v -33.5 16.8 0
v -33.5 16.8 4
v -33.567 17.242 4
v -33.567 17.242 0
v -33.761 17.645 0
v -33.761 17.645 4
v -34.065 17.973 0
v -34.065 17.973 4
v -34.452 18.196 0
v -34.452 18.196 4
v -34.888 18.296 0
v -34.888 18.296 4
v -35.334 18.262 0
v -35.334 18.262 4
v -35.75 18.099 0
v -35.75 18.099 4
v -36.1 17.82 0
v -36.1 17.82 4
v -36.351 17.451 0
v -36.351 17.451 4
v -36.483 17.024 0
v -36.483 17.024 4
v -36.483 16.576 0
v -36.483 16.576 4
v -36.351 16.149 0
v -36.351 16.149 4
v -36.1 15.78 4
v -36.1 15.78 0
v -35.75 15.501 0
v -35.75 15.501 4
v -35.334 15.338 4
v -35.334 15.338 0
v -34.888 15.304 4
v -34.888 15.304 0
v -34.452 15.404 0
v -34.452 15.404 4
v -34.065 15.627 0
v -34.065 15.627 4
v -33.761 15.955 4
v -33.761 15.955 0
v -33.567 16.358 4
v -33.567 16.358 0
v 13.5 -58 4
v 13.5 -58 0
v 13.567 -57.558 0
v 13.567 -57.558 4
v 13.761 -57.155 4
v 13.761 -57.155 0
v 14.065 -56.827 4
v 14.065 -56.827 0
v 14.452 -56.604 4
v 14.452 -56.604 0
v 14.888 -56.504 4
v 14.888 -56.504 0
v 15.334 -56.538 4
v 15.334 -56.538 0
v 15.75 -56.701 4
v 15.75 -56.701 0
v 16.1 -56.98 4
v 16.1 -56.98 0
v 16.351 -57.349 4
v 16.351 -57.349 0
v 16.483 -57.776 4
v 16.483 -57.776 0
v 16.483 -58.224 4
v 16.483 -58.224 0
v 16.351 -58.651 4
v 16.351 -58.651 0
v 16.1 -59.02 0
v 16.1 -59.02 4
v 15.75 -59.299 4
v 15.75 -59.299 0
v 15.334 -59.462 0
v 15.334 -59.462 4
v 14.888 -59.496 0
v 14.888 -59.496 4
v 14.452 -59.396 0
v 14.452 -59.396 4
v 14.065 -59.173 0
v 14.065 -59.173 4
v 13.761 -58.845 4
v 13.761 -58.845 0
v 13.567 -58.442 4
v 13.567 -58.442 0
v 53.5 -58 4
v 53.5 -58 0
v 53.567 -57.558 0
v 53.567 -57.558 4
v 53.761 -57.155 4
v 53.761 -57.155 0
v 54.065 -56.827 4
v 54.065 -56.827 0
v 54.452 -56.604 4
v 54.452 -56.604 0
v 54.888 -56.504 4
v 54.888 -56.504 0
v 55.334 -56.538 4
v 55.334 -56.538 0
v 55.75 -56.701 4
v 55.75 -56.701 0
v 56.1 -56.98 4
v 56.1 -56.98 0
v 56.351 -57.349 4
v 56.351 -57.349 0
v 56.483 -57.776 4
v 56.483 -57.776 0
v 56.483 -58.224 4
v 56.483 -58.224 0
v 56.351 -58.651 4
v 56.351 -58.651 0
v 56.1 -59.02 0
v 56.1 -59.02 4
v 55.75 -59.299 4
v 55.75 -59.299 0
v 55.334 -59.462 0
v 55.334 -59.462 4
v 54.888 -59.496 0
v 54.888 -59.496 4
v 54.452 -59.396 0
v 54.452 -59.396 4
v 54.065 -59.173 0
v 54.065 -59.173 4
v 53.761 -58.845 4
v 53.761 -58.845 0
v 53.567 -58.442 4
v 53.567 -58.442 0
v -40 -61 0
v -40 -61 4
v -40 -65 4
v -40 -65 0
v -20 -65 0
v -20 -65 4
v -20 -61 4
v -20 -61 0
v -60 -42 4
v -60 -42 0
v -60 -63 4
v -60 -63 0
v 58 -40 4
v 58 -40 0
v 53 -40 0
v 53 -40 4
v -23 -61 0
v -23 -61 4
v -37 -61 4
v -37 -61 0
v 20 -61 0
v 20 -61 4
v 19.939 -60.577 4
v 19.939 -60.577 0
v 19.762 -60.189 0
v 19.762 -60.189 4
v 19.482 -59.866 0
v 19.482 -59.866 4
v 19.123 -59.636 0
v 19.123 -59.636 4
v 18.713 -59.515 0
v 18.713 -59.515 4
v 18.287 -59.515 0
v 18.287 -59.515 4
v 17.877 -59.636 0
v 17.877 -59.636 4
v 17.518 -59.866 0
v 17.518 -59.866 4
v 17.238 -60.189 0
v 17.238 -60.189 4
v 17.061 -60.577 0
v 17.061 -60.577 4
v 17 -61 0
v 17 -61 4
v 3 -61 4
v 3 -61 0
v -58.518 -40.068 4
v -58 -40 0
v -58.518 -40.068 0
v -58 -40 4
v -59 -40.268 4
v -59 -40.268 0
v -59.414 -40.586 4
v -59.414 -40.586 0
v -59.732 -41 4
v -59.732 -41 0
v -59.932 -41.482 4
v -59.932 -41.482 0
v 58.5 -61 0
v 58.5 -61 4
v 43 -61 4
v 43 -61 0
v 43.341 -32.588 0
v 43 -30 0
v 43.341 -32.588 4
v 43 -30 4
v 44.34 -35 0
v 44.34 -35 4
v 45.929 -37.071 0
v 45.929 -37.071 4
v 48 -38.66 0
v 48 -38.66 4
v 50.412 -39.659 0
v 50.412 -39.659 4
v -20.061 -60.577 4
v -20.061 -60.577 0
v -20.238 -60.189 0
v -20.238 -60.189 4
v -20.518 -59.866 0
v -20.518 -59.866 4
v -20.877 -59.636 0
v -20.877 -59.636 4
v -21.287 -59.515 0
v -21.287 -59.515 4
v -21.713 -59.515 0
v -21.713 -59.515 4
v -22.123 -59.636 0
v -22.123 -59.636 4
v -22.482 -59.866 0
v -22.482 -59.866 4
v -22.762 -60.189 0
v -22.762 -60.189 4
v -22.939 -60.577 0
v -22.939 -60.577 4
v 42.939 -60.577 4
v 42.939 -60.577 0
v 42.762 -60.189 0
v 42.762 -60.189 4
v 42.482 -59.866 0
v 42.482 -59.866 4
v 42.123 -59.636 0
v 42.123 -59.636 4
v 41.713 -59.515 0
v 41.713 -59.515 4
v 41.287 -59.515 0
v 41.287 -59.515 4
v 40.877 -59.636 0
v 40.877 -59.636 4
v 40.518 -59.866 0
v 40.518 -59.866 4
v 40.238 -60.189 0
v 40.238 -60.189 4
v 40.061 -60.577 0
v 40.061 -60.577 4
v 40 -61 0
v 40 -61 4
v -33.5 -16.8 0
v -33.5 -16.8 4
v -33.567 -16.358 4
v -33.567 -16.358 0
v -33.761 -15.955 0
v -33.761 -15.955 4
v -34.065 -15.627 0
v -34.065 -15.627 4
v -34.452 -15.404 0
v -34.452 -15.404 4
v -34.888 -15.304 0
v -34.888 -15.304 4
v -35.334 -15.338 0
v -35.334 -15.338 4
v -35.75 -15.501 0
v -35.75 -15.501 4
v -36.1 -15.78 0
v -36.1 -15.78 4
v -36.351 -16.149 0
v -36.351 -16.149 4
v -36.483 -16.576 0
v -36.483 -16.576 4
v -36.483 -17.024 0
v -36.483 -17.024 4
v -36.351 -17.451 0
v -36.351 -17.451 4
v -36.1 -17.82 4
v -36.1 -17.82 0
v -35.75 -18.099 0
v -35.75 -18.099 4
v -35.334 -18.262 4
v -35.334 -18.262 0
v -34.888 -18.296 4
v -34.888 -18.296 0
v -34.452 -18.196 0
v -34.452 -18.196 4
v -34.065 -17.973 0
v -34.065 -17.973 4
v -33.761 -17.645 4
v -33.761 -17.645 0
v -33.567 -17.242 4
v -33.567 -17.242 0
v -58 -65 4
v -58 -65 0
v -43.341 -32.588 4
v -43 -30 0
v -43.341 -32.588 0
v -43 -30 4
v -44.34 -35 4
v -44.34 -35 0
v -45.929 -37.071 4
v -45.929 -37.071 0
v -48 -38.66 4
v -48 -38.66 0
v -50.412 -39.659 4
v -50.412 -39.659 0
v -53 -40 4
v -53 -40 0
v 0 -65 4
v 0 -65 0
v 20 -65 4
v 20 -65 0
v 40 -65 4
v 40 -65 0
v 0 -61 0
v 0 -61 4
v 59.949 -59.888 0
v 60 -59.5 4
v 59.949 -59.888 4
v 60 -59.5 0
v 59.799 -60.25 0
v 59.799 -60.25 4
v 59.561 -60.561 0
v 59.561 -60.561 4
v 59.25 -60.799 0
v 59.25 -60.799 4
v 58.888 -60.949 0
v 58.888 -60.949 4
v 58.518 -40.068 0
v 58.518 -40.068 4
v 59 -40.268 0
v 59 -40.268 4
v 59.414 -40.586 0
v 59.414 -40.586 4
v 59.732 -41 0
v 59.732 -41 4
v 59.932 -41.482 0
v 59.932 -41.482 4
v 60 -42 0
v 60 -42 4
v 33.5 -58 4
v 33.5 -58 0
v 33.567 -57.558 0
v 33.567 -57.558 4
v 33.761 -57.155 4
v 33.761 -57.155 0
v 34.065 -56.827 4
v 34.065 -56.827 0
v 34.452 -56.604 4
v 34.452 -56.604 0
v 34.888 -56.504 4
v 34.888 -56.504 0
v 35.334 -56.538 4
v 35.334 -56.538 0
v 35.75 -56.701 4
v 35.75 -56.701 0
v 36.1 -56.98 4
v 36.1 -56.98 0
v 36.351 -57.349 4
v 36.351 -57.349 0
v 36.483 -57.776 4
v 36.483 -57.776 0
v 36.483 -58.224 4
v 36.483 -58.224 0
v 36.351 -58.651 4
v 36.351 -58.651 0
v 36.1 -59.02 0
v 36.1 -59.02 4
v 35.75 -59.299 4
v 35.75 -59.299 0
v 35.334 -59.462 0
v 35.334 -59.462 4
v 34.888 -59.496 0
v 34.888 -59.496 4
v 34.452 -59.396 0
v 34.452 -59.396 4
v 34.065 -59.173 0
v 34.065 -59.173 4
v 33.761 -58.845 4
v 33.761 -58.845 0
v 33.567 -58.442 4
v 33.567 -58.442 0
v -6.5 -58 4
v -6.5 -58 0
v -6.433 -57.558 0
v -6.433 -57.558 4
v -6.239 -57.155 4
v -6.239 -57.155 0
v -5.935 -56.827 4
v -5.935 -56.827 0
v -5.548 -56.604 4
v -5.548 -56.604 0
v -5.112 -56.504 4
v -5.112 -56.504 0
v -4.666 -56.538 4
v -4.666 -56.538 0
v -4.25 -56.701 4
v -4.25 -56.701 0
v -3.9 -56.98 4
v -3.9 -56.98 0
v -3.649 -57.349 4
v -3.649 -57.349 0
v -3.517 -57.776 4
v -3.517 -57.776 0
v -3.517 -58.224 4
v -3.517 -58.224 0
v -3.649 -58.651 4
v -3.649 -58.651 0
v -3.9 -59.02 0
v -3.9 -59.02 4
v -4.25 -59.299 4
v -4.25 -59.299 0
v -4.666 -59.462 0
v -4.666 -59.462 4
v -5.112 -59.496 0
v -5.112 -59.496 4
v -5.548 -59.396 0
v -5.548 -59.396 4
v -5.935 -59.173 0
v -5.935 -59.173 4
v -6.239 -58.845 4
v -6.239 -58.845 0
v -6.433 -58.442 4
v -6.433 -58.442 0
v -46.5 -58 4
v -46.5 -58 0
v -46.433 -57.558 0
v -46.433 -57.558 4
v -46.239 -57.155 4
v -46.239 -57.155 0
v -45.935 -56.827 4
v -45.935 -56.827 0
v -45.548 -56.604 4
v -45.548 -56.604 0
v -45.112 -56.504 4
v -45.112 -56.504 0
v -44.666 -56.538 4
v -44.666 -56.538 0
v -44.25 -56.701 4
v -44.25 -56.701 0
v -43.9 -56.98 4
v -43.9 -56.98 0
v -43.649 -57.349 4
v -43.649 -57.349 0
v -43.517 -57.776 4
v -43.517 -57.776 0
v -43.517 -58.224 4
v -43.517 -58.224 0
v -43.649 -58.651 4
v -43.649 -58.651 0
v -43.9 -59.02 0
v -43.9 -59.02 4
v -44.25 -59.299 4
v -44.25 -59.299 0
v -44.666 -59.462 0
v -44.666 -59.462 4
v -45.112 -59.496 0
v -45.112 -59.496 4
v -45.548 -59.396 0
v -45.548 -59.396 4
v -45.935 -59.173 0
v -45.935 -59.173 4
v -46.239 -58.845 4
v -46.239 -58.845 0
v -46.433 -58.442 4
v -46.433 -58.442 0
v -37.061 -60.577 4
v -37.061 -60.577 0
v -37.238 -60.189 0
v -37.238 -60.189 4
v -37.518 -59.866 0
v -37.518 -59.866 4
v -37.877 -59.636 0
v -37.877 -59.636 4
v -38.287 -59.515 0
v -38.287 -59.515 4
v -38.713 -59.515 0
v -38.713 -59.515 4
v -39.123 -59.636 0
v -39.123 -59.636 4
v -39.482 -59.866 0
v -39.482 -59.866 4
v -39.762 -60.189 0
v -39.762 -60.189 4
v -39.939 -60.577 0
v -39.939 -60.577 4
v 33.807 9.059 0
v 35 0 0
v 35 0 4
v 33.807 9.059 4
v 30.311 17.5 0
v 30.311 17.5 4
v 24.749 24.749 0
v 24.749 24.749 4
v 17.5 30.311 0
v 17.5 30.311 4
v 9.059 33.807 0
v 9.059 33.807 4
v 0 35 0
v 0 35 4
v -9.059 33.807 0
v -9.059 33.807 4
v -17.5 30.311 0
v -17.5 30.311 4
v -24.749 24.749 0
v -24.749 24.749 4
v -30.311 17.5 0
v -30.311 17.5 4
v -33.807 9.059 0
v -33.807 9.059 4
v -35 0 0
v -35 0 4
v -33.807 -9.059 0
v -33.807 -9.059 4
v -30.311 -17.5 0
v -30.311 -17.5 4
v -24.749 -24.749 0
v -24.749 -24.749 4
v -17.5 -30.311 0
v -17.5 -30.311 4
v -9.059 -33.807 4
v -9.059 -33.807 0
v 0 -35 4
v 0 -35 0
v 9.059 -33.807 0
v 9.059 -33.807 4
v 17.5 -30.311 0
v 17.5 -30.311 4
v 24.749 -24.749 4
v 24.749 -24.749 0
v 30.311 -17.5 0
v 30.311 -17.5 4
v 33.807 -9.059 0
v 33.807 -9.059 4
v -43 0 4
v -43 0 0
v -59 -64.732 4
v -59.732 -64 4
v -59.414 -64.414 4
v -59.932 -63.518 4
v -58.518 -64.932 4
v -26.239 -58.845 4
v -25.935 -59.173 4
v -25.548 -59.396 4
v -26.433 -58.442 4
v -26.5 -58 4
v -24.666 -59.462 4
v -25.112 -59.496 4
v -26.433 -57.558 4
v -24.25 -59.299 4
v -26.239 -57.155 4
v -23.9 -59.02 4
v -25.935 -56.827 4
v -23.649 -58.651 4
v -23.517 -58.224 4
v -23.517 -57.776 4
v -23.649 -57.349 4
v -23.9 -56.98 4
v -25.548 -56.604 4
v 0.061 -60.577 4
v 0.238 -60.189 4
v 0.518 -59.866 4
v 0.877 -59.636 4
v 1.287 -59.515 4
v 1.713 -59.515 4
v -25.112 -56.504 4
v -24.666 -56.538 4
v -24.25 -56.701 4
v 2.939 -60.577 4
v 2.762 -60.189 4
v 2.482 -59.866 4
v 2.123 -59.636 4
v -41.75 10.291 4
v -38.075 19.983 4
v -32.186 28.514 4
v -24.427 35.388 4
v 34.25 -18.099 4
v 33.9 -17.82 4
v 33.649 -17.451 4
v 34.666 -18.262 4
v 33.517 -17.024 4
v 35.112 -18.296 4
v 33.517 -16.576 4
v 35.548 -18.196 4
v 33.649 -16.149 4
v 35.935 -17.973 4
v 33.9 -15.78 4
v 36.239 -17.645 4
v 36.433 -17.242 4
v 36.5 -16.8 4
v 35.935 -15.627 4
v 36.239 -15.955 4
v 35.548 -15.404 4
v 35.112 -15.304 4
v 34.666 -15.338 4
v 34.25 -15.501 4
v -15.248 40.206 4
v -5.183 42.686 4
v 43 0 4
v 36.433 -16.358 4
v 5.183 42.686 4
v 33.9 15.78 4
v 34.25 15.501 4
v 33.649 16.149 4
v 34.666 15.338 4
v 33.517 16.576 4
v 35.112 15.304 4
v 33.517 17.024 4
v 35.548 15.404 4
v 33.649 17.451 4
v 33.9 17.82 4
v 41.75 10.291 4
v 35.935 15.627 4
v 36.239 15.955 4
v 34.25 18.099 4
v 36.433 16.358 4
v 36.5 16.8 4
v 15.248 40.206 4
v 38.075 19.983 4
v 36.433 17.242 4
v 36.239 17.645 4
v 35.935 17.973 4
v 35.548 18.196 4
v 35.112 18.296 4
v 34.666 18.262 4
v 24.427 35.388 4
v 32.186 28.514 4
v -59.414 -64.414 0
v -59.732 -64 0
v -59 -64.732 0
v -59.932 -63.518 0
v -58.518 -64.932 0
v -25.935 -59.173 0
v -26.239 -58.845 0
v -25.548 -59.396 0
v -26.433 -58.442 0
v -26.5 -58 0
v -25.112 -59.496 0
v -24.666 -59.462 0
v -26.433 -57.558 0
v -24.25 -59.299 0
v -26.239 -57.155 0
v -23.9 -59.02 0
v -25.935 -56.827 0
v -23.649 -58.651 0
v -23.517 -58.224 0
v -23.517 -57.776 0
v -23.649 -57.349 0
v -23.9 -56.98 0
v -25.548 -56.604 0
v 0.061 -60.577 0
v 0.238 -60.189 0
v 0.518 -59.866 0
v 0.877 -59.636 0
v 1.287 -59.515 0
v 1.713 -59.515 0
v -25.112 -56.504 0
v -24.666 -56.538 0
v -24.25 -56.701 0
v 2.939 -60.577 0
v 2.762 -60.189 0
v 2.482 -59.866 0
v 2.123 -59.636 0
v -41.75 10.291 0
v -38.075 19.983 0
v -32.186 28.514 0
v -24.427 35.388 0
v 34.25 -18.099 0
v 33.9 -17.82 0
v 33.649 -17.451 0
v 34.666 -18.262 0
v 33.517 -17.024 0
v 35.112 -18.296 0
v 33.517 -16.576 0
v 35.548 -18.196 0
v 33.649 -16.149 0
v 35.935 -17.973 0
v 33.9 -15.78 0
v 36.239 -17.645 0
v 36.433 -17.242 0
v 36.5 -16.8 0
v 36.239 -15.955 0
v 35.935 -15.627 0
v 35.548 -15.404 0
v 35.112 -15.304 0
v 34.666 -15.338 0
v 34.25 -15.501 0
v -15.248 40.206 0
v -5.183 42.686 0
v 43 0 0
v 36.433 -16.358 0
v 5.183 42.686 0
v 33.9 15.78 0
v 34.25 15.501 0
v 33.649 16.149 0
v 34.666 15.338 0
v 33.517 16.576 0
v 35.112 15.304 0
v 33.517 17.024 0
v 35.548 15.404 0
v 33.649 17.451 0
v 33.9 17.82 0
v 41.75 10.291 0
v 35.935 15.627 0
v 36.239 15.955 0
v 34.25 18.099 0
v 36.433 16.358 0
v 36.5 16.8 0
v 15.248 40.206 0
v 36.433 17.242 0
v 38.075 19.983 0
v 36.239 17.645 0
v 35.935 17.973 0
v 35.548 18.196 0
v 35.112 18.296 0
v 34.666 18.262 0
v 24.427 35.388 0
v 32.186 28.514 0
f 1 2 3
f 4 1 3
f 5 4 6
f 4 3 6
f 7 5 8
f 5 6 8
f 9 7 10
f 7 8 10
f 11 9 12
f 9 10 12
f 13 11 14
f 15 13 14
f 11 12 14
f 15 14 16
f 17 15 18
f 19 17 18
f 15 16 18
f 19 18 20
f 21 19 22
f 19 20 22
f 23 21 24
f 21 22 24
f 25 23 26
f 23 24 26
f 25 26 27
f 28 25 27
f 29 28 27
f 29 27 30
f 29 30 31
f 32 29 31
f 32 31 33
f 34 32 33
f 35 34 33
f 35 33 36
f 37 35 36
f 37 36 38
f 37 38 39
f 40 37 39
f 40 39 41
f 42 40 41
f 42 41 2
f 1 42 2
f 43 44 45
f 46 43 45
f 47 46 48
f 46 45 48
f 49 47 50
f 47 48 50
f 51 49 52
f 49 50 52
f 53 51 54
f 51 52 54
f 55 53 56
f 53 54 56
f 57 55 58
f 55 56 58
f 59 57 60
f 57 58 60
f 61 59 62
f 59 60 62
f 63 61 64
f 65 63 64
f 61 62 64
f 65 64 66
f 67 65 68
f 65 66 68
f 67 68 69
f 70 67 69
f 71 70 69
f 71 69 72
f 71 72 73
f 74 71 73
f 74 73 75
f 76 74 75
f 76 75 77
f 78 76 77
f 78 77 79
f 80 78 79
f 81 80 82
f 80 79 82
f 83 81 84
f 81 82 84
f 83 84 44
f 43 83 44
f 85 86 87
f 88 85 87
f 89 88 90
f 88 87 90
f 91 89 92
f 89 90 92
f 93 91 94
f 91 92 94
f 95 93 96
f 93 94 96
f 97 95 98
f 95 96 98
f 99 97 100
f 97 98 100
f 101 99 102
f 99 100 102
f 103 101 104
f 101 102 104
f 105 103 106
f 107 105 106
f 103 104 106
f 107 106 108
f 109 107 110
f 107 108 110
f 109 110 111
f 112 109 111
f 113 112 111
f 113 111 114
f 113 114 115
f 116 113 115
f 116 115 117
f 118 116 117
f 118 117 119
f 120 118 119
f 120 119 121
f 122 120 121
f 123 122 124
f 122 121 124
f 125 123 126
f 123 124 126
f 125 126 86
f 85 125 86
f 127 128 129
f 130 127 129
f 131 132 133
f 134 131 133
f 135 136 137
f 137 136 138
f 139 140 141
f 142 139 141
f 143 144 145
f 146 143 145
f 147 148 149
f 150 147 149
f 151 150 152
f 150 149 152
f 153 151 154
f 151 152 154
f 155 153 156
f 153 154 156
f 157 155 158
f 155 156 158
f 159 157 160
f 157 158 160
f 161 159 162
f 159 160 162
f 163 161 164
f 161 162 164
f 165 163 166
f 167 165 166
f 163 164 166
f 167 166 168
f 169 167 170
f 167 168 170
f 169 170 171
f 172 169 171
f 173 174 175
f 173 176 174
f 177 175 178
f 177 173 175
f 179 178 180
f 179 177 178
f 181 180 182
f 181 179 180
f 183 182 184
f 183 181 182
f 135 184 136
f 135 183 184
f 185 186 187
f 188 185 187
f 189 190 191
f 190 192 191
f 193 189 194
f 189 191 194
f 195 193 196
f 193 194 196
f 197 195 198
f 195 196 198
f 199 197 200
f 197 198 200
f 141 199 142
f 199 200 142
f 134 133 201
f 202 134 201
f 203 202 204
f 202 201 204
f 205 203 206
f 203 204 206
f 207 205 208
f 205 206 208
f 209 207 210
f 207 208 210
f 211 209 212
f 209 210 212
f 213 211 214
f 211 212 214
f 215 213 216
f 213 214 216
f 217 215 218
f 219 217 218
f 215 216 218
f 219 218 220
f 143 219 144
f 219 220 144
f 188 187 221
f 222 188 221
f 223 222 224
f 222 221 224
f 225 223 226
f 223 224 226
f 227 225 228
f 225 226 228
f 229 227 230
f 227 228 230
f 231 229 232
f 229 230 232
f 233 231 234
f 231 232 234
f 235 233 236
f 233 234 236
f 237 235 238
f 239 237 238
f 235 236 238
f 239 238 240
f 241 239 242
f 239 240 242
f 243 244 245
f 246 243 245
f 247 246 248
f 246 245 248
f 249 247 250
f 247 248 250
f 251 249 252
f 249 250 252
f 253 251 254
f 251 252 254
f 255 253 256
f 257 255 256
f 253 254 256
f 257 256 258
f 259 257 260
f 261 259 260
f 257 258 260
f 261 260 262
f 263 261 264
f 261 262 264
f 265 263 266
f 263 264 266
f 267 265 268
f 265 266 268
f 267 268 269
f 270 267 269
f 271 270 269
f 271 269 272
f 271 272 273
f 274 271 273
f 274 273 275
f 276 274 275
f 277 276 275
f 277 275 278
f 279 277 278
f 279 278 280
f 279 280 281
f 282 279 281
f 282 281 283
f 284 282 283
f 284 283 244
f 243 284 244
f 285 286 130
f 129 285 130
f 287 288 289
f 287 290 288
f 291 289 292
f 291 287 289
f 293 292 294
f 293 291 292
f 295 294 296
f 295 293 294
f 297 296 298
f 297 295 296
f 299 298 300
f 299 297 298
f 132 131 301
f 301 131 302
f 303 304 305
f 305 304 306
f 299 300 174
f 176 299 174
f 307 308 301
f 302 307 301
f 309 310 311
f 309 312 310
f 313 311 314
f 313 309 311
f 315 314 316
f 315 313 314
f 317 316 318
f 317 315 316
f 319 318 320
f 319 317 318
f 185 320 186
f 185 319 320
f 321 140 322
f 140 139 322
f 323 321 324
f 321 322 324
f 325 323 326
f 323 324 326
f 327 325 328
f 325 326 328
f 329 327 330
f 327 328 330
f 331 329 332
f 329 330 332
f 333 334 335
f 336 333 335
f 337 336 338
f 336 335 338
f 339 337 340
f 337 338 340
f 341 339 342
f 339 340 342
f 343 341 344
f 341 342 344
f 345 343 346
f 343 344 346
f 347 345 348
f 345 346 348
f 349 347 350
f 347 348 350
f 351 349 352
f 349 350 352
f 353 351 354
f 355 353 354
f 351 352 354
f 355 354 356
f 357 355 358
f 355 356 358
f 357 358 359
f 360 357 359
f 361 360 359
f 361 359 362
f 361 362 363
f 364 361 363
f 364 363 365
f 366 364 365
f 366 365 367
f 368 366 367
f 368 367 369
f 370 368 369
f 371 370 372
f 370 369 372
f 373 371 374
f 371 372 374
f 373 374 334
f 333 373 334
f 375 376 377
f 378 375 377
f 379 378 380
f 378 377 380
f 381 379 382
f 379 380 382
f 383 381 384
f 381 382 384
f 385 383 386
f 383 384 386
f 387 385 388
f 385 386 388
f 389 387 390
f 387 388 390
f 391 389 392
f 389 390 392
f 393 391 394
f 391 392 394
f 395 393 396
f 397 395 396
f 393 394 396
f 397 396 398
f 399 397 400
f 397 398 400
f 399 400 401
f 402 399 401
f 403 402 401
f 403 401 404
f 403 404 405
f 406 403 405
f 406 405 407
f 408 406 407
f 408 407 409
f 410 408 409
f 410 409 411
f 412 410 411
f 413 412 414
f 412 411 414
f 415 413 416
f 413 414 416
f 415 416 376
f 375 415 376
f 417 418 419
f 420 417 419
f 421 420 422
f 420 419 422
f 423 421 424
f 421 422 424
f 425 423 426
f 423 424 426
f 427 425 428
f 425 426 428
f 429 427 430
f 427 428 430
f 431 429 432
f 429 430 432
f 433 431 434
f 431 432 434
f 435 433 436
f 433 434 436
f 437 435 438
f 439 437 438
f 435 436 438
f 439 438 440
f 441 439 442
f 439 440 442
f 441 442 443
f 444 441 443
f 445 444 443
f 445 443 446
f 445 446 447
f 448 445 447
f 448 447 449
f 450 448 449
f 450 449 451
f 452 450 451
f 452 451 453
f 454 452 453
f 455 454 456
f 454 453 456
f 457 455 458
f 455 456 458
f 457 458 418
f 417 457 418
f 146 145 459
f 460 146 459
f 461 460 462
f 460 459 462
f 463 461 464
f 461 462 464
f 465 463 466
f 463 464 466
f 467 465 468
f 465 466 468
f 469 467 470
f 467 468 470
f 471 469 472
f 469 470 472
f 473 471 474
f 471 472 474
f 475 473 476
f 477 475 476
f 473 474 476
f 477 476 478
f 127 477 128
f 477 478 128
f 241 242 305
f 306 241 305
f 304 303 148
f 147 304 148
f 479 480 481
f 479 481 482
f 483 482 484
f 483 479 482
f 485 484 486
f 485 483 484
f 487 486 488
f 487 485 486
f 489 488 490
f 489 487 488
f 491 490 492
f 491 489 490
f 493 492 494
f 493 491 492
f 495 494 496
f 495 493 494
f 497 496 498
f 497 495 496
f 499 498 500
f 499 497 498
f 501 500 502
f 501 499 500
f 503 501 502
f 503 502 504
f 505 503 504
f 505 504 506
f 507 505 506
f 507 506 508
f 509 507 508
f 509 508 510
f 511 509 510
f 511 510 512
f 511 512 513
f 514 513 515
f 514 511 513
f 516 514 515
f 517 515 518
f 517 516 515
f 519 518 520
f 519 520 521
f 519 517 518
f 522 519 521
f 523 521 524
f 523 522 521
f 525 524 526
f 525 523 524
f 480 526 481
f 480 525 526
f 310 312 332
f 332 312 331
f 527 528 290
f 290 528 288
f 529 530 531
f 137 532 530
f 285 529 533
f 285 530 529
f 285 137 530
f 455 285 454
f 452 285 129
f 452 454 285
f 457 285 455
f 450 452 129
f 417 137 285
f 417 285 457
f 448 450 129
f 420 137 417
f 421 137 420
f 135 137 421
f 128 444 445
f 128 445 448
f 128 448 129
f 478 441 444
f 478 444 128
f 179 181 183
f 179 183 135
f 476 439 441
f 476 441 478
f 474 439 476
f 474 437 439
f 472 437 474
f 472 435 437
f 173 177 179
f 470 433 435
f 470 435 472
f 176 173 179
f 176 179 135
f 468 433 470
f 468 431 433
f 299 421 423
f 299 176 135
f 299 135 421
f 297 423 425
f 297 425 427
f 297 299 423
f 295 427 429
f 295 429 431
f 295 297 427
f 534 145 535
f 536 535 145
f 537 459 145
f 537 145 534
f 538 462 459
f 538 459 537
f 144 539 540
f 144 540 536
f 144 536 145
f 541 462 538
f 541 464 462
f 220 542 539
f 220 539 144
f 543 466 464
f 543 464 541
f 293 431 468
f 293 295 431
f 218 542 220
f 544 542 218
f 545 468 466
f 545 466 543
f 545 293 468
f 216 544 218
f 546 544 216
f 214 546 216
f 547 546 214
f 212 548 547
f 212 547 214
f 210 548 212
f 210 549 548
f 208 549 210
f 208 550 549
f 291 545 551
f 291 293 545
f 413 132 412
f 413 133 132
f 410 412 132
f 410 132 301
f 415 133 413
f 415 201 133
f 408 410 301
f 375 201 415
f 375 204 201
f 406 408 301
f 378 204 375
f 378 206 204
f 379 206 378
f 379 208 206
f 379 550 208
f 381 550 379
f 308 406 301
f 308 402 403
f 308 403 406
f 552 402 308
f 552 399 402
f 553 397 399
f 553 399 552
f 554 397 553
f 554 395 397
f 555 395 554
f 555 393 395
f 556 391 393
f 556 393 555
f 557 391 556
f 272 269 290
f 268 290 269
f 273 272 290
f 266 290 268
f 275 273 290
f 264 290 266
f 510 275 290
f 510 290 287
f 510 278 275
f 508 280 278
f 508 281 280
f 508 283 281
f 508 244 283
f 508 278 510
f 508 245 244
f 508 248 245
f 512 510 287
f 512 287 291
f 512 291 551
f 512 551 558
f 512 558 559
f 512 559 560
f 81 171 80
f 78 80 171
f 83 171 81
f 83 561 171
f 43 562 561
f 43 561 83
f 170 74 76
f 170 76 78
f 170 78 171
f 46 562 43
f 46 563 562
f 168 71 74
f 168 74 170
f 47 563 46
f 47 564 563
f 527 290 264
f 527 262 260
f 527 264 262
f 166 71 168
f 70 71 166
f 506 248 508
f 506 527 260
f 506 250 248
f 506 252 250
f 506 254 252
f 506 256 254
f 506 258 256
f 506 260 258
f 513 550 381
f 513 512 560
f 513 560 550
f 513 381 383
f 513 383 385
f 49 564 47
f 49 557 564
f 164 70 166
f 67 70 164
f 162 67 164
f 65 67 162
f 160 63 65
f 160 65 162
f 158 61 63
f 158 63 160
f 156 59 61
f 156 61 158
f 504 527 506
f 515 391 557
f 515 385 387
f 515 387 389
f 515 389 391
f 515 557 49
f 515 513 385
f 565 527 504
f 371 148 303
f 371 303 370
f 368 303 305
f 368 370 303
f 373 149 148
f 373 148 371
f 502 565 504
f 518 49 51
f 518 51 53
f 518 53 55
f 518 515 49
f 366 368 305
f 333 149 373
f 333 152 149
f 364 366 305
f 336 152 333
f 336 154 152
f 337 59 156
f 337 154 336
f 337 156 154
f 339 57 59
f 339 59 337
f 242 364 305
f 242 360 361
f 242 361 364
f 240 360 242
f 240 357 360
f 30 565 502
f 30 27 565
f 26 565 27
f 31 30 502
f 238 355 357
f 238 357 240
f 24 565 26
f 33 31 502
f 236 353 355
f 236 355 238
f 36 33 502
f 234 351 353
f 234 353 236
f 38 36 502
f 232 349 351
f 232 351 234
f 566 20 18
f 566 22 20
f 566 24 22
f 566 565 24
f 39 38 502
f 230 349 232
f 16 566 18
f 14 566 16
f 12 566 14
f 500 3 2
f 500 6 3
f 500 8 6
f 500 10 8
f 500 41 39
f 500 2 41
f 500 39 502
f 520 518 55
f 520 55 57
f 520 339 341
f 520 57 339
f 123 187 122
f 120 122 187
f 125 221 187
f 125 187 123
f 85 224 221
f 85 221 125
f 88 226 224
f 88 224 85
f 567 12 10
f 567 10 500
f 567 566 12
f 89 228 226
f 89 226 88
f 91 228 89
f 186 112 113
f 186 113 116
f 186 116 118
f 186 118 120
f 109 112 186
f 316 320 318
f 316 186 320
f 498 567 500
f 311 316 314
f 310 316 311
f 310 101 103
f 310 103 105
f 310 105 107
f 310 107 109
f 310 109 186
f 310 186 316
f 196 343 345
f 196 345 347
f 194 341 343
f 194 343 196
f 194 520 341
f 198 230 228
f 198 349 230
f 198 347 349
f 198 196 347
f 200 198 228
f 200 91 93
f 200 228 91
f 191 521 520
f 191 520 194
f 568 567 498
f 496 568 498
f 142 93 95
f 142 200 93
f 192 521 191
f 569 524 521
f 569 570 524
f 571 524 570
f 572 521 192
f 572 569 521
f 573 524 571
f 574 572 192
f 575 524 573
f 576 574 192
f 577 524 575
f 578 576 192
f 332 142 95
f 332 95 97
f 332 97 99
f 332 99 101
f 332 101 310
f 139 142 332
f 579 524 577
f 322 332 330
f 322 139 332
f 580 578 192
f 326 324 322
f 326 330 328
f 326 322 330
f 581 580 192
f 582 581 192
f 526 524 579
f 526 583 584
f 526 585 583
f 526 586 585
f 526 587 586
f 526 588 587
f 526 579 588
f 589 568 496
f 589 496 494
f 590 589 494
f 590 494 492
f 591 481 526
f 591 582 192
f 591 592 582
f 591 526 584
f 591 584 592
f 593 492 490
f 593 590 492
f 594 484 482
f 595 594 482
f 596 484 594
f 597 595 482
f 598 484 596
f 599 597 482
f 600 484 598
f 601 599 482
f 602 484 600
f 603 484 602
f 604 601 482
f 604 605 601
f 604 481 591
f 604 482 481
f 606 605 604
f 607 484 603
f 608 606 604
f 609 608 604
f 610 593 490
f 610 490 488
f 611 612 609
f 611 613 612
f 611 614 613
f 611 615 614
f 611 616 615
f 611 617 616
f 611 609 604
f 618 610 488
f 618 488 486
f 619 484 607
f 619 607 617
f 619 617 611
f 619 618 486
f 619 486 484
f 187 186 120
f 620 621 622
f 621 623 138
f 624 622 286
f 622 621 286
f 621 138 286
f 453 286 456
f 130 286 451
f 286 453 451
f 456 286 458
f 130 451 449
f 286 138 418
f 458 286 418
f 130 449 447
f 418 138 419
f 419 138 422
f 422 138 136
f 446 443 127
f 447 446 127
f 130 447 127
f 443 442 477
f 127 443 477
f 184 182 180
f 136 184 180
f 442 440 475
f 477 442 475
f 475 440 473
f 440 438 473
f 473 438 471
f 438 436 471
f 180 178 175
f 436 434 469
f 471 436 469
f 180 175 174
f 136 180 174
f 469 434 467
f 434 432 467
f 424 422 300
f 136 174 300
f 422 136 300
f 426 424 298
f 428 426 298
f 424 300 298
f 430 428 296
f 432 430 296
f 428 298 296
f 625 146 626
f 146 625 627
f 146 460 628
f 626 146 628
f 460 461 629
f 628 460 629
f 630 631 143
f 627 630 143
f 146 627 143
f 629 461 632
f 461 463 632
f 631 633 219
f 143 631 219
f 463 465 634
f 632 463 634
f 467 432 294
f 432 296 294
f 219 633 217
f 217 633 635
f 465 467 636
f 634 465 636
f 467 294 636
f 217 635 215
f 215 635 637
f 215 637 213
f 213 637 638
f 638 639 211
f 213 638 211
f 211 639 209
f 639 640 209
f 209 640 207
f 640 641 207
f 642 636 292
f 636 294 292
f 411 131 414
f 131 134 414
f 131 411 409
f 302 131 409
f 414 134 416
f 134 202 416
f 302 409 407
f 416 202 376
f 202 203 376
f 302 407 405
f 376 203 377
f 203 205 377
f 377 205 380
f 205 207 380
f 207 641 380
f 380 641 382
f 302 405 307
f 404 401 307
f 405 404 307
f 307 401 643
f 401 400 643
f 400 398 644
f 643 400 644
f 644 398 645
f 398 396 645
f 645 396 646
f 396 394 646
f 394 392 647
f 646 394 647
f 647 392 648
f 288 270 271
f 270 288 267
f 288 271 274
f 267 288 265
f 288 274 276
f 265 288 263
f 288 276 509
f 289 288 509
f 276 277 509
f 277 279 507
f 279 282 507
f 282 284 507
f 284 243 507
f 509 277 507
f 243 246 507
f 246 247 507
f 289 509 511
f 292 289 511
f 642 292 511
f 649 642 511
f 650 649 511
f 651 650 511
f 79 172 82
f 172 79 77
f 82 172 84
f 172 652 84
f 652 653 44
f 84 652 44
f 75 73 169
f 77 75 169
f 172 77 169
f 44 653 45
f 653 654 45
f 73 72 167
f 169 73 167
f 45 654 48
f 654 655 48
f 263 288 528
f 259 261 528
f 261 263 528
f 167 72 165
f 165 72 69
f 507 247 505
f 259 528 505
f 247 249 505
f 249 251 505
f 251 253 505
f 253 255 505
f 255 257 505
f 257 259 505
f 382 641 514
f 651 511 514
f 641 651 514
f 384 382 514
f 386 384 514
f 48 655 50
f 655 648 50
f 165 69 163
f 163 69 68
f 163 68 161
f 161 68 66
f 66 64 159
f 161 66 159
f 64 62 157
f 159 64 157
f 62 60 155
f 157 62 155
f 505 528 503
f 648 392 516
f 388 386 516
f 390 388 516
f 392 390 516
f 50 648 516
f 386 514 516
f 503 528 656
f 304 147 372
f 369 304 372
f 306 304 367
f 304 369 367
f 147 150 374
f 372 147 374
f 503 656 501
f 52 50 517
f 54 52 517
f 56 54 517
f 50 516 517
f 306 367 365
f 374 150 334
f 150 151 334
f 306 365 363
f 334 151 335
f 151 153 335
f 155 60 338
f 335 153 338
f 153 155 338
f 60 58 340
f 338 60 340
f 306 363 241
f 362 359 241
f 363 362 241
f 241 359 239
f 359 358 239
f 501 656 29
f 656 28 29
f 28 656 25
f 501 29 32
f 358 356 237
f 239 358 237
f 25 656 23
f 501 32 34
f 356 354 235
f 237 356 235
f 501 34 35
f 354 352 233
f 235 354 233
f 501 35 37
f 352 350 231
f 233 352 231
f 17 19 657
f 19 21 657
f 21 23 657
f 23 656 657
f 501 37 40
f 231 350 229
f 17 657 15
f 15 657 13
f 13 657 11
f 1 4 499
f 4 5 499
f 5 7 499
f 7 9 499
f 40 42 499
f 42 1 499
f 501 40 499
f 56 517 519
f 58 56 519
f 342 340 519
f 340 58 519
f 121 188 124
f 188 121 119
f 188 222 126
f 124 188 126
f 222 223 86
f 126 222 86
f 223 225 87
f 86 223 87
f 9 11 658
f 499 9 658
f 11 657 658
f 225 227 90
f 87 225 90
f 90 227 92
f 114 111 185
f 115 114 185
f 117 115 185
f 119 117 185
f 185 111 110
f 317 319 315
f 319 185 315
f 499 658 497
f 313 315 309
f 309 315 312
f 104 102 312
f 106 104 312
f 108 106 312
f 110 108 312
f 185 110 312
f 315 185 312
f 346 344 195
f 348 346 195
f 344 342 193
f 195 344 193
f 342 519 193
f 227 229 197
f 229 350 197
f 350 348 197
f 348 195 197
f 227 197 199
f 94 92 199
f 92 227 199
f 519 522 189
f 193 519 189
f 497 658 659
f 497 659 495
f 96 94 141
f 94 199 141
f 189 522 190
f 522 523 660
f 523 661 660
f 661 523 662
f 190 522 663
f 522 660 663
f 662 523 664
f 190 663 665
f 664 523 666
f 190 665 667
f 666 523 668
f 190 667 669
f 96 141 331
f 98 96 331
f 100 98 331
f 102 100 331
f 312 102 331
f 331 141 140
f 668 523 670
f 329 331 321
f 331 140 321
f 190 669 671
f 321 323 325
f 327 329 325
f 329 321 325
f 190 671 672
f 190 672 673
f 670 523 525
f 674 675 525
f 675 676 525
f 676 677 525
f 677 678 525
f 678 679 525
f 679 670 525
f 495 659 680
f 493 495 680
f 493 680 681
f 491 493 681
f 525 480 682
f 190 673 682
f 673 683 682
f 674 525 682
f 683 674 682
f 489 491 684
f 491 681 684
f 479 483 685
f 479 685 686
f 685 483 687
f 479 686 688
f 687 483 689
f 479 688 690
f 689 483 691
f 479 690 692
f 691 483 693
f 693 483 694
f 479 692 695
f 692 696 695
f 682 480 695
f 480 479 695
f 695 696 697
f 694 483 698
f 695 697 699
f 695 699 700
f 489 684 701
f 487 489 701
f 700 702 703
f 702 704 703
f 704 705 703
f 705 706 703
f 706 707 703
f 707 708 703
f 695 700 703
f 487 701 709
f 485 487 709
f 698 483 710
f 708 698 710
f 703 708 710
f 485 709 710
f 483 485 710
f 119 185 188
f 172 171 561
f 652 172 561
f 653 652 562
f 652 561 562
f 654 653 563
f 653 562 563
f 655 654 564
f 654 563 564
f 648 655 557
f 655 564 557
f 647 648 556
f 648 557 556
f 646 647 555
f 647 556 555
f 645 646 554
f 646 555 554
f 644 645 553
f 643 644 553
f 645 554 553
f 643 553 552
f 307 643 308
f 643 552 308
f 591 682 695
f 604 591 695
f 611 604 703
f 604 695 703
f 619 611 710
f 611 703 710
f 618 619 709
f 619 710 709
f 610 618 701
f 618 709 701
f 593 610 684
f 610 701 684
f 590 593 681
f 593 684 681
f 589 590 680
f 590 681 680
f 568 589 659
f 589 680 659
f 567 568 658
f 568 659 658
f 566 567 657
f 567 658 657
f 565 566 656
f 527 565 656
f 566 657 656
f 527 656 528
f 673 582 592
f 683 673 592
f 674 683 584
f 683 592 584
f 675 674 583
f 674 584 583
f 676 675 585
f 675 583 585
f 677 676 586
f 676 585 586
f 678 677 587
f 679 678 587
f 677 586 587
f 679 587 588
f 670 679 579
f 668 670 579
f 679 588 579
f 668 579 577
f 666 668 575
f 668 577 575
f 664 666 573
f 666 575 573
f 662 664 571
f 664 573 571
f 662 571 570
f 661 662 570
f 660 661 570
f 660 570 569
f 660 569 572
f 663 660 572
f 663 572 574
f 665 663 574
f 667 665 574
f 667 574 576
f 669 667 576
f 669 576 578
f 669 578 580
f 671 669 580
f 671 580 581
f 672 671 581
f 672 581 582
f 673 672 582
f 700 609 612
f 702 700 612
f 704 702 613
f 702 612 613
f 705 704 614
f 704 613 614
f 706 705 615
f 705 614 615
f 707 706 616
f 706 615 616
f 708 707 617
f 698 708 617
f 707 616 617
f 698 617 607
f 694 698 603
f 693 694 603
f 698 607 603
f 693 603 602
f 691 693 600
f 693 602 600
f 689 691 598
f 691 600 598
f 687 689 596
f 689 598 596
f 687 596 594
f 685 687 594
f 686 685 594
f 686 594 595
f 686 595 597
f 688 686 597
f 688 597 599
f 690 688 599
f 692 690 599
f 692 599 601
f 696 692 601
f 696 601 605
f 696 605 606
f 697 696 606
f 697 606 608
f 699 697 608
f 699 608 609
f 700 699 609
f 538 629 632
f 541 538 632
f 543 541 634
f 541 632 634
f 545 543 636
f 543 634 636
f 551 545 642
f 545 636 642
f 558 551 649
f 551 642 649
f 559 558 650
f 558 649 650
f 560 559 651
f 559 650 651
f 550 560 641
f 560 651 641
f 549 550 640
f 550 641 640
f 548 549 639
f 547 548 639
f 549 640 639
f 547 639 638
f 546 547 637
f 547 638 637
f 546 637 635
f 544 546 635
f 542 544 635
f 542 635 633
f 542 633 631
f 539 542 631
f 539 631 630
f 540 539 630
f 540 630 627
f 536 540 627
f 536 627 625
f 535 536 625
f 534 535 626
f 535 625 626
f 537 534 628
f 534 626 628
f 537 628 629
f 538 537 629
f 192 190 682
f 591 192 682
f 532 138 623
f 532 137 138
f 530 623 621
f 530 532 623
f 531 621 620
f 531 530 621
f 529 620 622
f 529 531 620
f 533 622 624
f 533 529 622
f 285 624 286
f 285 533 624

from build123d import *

# Parameters (mm, degrees)
SKETCH_1_R          = 43
SKETCH_1_R_2        = 35
EXTRUDE_1_DEPTH     = 4
SKETCH_2_R          = 1.5
CUT_EXTRUDE_1_DEPTH = 10
FILLET_1_R          = 10
FILLET_2_R          = 2
CUT_EXTRUDE_2_DEPTH = 10
FILLET_3_R          = 1.5
SKETCH_4_R          = 1.5
CUT_EXTRUDE_3_DEPTH = 4


with BuildPart() as part:
    # 草图1 → 凸台-拉伸1 (new body)
    # profile 1 of 2: a face of its own
    with BuildSketch(Plane.XY):
        Circle(SKETCH_1_R)
        Circle(SKETCH_1_R_2, mode=Mode.SUBTRACT)
    # profile 2 of 2: a face of its own
    with BuildSketch(Plane.XY):
        with BuildLine():
            ThreePointArc((43, 0), (0, -43), (-43, 0))
            Line((-43, 0), (-43, -40))
            Line((-43, -40), (-60, -40))
            Line((-60, -40), (-60, -65))
            Line((-60, -65), (60, -65))
            Line((60, -65), (60, -40))
            Line((60, -40), (43, -40))
            Line((43, -40), (43, 0))
        make_face()
    extrude(amount=EXTRUDE_1_DEPTH)

    # 草图2 → 切除-拉伸1 (cut)
    with BuildSketch(Plane.XY.offset(4)):
        with Locations((-35, 16.8)):
            Circle(SKETCH_2_R)
        with Locations((-35, -16.8)):
            Circle(SKETCH_2_R)
        with Locations((35, -16.8)):
            Circle(SKETCH_2_R)
        with Locations((35, 16.8)):
            Circle(SKETCH_2_R)
    extrude(amount=-CUT_EXTRUDE_1_DEPTH, mode=Mode.SUBTRACT)

    # 圆角1
    fillet_1_edges = [part.edges().sort_by_distance(p)[0] for p in [
        (43, -40, 2),
        (-43, -40, 2),
    ]]
    fillet(fillet_1_edges, radius=FILLET_1_R)

    # 圆角2
    fillet_2_edges = [part.edges().sort_by_distance(p)[0] for p in [
        (60, -40, 2),
        (60, -65, 2),
        (-60, -65, 2),
        (-60, -40, 2),
    ]]
    fillet(fillet_2_edges, radius=FILLET_2_R)

    # 草图3 → 切除-拉伸2 (cut)
    with BuildSketch(Plane.XY.offset(4)):
        Polygon((-40, -61), (-40, -65), (-20, -65), (-20, -61), (-23, -61), (-37, -61), align=None)
        with BuildLine():
            ThreePointArc((-37, -61), (-38.5, -59.5), (-40, -61))
            Line((-40, -61), (-37, -61))
        make_face()
        with BuildLine():
            Line((-23, -61), (-20, -61))
            ThreePointArc((-20, -61), (-21.5, -59.5), (-23, -61))
        make_face()
        with BuildLine():
            ThreePointArc((3, -61), (1.5, -59.5), (0, -61))
            Line((0, -61), (3, -61))
        make_face()
        Polygon((0, -61), (0, -65), (20, -65), (20, -61), (17, -61), (3, -61), align=None)
        with BuildLine():
            Line((17, -61), (20, -61))
            ThreePointArc((20, -61), (18.5, -59.5), (17, -61))
        make_face()
        with BuildLine():
            ThreePointArc((43, -61), (41.5, -59.5), (40, -61))
            Line((40, -61), (43, -61))
        make_face()
        with BuildLine():
            Line((40, -61), (40, -65))
            Line((40, -65), (58, -65))
            ThreePointArc((58, -65), (59.414213562, -64.414213562), (60, -63))
            Line((60, -63), (60, -61))
            Line((60, -61), (43, -61))
            Line((43, -61), (40, -61))
        make_face()
    extrude(amount=-CUT_EXTRUDE_2_DEPTH, mode=Mode.SUBTRACT)

    # 圆角3
    fillet_3_edges = [part.edges().sort_by_distance(p)[0] for p in [
        (60, -61, 2),
    ]]
    fillet(fillet_3_edges, radius=FILLET_3_R)

    # 草图4 → 切除-拉伸3 (cut)
    with BuildSketch(Plane(origin=(0, 0, 0), x_dir=(-1, 0, 0), z_dir=(0, 0, -1))):
        with Locations((-55, -58)):
            Circle(SKETCH_4_R)
        with Locations((-35, -58)):
            Circle(SKETCH_4_R)
        with Locations((-15, -58)):
            Circle(SKETCH_4_R)
        with Locations((5, -58)):
            Circle(SKETCH_4_R)
        with Locations((25, -58)):
            Circle(SKETCH_4_R)
        with Locations((45, -58)):
            Circle(SKETCH_4_R)
    extrude(amount=-CUT_EXTRUDE_3_DEPTH, mode=Mode.SUBTRACT)


solid = part.part
